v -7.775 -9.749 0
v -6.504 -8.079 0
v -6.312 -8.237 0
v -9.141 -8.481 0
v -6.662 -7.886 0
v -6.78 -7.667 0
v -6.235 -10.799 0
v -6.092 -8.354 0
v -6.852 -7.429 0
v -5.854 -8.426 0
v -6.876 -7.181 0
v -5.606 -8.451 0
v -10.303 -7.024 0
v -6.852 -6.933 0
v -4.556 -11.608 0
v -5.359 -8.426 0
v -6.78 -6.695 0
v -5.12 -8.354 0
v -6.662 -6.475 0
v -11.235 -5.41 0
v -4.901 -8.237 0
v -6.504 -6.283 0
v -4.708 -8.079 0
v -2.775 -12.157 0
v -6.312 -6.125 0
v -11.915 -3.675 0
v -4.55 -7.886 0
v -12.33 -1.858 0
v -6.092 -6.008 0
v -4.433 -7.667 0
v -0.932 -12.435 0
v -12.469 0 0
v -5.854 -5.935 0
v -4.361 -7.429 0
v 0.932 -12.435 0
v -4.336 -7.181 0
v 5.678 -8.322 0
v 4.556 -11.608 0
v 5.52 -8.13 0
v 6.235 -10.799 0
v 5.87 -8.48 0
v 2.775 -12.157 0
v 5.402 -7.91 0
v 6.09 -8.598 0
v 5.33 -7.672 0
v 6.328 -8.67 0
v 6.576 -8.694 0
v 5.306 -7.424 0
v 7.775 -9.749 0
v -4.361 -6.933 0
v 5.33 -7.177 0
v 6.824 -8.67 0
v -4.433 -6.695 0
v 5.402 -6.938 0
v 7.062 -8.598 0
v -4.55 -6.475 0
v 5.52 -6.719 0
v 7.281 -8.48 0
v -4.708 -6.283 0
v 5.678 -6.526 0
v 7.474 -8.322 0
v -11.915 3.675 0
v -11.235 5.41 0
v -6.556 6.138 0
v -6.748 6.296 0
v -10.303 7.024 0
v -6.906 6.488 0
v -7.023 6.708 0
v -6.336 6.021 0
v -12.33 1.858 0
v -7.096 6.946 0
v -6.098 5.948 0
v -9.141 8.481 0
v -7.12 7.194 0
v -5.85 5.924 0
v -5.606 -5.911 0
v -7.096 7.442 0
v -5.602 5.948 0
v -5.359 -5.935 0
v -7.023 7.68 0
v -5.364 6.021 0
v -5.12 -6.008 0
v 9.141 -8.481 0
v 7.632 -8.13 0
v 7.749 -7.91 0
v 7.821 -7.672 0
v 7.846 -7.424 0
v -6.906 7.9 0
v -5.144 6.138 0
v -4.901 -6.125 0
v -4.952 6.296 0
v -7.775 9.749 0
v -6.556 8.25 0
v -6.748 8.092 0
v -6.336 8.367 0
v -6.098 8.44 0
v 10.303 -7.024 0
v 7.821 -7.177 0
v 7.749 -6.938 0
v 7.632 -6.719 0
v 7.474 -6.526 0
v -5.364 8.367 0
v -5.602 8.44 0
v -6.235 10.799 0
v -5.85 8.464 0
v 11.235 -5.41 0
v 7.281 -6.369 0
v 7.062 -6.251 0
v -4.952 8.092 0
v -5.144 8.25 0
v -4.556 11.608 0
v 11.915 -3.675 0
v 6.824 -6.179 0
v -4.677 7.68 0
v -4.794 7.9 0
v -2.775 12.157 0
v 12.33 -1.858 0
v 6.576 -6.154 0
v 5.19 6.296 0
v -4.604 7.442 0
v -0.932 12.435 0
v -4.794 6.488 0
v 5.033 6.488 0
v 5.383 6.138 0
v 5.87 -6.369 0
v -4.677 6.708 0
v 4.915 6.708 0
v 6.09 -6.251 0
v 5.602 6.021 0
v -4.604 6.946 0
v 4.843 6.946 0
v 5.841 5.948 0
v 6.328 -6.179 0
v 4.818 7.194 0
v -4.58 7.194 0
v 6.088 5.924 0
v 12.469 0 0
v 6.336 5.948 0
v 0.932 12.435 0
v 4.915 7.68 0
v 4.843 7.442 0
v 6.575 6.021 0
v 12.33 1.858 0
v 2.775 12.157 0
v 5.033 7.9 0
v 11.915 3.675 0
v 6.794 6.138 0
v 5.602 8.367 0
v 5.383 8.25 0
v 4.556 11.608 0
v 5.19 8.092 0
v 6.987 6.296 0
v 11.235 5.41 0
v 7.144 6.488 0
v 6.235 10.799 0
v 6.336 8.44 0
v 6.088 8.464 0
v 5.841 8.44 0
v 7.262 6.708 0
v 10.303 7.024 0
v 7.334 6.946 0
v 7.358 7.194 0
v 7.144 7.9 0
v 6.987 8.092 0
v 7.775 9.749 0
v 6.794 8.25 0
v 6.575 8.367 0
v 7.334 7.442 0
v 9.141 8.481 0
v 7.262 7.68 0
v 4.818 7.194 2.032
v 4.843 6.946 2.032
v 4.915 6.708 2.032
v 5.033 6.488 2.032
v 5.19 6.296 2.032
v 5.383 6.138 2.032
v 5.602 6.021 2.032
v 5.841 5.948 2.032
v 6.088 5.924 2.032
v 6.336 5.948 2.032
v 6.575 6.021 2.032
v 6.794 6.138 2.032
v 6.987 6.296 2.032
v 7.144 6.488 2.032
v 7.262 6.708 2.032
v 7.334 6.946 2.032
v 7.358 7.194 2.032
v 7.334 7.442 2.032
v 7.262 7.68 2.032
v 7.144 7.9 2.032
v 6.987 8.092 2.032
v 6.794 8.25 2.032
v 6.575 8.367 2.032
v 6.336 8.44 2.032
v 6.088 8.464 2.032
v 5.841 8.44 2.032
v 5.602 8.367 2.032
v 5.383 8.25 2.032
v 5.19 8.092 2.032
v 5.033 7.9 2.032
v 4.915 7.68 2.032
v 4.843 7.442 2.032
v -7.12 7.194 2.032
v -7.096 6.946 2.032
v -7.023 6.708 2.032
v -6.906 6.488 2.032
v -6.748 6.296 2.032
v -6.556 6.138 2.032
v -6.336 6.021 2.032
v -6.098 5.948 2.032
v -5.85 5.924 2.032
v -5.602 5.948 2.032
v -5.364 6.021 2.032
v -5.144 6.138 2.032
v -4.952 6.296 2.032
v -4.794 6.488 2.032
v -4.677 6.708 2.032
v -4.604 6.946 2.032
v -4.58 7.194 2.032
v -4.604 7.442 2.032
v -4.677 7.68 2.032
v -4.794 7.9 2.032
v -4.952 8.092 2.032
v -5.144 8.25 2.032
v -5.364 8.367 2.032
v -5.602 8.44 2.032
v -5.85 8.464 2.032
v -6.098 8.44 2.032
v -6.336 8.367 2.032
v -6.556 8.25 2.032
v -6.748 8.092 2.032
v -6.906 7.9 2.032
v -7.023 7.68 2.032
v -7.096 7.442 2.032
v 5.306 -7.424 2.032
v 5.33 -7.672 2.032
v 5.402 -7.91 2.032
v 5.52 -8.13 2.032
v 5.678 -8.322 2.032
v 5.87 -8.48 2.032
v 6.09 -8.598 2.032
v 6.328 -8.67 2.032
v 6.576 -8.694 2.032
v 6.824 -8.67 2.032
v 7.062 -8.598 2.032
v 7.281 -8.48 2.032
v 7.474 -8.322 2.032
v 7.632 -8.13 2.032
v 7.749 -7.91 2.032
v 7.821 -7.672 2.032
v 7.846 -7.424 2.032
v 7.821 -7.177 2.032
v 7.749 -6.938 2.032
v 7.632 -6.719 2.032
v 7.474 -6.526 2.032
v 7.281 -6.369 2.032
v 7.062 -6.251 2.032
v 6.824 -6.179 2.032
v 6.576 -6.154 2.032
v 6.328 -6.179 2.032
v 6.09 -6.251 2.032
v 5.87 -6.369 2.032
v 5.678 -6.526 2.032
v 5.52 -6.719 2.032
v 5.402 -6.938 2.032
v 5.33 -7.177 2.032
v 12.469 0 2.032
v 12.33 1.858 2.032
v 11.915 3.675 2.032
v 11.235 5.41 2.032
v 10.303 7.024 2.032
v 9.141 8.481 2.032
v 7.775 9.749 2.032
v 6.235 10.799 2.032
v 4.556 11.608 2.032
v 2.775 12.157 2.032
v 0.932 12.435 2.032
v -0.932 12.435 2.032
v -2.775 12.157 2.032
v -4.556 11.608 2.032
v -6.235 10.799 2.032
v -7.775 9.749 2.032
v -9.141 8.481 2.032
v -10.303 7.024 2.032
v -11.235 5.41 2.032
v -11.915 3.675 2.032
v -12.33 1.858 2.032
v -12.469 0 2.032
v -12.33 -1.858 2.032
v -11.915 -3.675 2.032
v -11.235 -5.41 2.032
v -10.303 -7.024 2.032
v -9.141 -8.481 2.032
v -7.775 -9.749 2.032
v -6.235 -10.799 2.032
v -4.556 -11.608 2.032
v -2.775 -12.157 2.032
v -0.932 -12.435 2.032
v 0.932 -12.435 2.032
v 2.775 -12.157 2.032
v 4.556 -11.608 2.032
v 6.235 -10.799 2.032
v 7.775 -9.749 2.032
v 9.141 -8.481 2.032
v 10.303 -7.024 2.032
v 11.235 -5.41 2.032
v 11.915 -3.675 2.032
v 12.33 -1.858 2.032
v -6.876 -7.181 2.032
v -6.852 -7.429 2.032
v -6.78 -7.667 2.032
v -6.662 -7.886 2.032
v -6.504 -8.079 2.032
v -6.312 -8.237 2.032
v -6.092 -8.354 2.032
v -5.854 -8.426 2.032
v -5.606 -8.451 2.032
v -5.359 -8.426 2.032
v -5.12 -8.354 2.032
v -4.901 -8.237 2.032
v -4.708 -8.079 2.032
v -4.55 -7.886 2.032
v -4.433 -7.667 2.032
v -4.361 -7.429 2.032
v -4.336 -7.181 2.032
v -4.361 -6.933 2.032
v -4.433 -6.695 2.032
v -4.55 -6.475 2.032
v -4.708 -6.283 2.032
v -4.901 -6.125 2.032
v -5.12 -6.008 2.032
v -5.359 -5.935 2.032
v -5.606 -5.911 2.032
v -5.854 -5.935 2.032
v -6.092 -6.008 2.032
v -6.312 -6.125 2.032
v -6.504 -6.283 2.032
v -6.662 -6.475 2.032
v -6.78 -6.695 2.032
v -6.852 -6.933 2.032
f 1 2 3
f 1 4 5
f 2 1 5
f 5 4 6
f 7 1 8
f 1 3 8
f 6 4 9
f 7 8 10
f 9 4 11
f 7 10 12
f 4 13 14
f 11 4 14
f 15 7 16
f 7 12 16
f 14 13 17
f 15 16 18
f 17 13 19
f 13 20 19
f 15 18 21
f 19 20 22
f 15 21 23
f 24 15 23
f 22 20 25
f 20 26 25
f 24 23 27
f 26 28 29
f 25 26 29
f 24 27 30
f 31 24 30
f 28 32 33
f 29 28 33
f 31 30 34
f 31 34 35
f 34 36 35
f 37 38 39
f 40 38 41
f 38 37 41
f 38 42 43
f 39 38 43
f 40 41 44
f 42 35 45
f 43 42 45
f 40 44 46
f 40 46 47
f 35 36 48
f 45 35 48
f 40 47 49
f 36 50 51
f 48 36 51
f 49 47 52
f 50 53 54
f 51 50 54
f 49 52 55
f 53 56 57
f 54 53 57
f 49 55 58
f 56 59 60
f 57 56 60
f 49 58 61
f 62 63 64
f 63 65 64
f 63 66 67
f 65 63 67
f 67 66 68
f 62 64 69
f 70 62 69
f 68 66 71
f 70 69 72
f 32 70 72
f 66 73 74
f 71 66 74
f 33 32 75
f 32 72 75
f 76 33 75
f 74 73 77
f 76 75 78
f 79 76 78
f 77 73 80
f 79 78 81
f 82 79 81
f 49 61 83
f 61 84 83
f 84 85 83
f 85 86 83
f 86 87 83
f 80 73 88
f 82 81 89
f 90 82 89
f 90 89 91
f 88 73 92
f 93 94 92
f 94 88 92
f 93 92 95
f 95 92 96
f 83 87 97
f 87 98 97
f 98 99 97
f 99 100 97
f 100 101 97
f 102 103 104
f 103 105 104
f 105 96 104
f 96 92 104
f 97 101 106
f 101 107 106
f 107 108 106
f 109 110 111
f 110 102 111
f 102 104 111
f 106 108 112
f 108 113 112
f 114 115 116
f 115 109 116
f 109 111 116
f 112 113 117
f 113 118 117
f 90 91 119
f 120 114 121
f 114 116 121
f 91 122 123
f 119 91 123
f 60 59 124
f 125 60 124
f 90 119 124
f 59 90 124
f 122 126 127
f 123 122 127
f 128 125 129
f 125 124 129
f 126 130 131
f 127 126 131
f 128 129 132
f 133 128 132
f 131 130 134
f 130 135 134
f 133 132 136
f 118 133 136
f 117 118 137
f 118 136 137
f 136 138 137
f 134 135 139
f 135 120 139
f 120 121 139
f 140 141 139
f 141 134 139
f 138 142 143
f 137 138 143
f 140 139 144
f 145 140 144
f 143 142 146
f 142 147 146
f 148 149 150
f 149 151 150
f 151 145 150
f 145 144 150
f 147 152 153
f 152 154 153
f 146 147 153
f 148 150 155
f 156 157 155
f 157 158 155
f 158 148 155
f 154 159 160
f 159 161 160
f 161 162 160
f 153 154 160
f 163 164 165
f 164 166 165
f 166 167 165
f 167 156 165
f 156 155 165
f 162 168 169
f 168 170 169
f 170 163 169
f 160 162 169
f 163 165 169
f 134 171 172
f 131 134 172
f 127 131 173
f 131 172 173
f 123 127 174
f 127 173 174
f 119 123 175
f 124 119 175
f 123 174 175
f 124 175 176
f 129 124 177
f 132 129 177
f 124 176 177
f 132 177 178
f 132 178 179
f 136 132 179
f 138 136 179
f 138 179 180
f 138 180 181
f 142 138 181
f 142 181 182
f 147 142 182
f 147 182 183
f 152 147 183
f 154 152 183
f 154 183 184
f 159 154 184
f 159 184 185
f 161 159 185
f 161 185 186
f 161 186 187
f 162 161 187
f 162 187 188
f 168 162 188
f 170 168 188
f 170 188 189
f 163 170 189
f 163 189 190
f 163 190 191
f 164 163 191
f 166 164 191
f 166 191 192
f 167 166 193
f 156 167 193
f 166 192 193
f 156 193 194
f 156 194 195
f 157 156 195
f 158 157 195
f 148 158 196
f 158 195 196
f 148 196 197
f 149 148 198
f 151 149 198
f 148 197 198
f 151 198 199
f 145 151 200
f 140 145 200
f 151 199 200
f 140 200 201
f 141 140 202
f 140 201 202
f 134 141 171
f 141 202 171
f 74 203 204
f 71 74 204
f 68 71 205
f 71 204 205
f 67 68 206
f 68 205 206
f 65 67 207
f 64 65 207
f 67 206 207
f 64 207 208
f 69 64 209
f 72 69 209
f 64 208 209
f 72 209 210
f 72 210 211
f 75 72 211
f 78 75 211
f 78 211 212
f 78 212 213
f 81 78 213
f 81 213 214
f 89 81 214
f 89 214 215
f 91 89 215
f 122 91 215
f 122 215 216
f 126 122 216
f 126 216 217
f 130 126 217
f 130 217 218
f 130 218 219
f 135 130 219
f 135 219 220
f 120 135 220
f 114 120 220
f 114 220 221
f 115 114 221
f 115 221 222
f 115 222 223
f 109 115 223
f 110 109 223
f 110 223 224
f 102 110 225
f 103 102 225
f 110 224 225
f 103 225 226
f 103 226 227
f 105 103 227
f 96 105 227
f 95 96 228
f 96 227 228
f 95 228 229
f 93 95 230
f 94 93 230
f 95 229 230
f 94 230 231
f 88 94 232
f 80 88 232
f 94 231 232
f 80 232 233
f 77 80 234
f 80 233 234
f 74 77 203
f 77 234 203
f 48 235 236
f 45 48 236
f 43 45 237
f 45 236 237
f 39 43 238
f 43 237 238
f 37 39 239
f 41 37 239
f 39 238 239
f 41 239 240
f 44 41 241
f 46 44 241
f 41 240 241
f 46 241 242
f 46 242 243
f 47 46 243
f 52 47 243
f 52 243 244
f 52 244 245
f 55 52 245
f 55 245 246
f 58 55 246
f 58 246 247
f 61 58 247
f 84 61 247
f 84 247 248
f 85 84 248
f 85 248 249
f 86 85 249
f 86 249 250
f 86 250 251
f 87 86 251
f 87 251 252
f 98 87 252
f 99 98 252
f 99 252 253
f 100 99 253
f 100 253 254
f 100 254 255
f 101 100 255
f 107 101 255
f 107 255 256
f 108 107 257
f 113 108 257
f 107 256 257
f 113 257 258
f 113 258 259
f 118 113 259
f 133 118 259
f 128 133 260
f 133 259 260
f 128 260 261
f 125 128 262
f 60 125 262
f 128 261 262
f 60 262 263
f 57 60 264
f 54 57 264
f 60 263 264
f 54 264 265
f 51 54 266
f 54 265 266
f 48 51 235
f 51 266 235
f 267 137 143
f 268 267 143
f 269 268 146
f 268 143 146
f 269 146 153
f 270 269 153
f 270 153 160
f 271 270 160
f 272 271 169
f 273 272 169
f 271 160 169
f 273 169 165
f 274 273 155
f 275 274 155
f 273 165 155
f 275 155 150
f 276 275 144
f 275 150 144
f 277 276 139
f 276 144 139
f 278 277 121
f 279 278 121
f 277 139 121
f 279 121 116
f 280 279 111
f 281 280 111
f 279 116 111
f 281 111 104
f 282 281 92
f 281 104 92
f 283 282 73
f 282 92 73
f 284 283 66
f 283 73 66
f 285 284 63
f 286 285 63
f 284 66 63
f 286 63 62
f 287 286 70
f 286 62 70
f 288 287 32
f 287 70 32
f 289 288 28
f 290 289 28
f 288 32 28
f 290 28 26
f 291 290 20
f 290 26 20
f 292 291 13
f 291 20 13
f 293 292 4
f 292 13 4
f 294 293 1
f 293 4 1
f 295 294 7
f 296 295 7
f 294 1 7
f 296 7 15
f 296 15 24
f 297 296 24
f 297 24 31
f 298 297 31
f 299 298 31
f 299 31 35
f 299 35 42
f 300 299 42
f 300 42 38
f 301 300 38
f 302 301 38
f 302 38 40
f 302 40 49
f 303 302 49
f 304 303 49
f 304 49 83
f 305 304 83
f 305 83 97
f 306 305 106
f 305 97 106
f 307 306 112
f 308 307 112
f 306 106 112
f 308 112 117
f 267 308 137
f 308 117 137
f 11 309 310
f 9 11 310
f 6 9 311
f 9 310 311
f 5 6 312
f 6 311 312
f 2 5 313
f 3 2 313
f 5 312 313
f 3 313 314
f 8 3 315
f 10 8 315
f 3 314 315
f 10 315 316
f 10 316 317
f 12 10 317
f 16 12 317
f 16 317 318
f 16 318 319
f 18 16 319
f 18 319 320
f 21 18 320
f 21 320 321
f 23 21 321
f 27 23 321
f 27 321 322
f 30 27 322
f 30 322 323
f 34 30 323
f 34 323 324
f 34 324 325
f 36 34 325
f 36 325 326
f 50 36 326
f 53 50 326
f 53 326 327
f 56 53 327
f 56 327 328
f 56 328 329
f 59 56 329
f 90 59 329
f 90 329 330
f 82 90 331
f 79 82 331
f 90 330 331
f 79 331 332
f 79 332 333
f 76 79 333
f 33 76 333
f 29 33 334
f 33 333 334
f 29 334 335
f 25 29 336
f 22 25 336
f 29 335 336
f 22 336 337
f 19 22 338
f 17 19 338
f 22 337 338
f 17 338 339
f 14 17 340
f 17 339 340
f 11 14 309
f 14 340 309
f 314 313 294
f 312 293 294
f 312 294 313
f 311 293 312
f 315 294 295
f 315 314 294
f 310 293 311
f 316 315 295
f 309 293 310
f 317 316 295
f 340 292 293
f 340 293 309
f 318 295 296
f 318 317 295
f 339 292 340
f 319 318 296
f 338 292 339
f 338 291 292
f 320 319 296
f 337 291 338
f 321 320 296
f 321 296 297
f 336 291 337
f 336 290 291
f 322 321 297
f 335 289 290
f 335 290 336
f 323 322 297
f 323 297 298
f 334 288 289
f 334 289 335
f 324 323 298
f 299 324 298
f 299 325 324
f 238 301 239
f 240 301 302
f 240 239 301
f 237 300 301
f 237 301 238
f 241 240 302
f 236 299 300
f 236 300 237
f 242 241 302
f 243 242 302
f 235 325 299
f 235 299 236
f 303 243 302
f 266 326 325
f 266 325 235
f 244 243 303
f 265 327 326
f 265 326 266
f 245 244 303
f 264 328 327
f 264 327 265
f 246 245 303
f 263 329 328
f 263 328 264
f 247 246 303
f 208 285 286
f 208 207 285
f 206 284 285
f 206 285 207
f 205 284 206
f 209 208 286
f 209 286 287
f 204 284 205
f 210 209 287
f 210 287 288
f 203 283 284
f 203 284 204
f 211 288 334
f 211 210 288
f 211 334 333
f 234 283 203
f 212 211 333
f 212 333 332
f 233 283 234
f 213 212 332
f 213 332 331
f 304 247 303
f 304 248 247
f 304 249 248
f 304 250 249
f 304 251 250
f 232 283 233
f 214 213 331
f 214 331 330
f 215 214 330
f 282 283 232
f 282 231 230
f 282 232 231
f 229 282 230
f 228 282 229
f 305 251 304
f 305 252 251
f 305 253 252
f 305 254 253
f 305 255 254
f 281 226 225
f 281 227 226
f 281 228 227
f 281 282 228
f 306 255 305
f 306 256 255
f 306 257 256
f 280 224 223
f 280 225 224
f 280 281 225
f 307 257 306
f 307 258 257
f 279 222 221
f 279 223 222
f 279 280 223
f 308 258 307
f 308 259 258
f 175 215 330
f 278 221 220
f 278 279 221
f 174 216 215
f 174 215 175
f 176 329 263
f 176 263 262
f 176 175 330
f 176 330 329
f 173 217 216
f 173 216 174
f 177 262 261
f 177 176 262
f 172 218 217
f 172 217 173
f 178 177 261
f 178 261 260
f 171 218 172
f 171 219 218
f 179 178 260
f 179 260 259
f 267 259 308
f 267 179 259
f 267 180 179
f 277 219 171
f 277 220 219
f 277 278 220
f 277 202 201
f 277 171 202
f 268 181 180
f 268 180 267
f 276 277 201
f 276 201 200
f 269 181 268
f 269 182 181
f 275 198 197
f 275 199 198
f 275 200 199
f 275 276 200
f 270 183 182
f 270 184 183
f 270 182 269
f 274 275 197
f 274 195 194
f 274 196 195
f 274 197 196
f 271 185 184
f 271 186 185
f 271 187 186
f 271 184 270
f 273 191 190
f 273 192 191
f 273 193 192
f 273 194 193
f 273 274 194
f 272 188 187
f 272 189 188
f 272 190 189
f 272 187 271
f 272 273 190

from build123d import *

# Parameters (mm, degrees)
F0_R     = 12.469473319
F2_DEPTH = 2.032
F3_D     = 2.54


with BuildPart() as f2:
    # F0 (on Top) → F2 (new body)
    with BuildSketch(Plane.XY):
        Circle(F0_R)
    extrude(amount=F2_DEPTH)

    # F3 (through all)
    with Locations(Plane(origin=(0, 0, 0), x_dir=(1, 0, 0), z_dir=(0, 0, -1))):
        with Locations((-5.6063276716, 7.1808281355), (6.5757827833, 7.4244700372), (6.0884971172, -7.1940617636), (-5.8499677107, -7.1940617636)):
            Hole(F3_D / 2)


solid = f2.part
